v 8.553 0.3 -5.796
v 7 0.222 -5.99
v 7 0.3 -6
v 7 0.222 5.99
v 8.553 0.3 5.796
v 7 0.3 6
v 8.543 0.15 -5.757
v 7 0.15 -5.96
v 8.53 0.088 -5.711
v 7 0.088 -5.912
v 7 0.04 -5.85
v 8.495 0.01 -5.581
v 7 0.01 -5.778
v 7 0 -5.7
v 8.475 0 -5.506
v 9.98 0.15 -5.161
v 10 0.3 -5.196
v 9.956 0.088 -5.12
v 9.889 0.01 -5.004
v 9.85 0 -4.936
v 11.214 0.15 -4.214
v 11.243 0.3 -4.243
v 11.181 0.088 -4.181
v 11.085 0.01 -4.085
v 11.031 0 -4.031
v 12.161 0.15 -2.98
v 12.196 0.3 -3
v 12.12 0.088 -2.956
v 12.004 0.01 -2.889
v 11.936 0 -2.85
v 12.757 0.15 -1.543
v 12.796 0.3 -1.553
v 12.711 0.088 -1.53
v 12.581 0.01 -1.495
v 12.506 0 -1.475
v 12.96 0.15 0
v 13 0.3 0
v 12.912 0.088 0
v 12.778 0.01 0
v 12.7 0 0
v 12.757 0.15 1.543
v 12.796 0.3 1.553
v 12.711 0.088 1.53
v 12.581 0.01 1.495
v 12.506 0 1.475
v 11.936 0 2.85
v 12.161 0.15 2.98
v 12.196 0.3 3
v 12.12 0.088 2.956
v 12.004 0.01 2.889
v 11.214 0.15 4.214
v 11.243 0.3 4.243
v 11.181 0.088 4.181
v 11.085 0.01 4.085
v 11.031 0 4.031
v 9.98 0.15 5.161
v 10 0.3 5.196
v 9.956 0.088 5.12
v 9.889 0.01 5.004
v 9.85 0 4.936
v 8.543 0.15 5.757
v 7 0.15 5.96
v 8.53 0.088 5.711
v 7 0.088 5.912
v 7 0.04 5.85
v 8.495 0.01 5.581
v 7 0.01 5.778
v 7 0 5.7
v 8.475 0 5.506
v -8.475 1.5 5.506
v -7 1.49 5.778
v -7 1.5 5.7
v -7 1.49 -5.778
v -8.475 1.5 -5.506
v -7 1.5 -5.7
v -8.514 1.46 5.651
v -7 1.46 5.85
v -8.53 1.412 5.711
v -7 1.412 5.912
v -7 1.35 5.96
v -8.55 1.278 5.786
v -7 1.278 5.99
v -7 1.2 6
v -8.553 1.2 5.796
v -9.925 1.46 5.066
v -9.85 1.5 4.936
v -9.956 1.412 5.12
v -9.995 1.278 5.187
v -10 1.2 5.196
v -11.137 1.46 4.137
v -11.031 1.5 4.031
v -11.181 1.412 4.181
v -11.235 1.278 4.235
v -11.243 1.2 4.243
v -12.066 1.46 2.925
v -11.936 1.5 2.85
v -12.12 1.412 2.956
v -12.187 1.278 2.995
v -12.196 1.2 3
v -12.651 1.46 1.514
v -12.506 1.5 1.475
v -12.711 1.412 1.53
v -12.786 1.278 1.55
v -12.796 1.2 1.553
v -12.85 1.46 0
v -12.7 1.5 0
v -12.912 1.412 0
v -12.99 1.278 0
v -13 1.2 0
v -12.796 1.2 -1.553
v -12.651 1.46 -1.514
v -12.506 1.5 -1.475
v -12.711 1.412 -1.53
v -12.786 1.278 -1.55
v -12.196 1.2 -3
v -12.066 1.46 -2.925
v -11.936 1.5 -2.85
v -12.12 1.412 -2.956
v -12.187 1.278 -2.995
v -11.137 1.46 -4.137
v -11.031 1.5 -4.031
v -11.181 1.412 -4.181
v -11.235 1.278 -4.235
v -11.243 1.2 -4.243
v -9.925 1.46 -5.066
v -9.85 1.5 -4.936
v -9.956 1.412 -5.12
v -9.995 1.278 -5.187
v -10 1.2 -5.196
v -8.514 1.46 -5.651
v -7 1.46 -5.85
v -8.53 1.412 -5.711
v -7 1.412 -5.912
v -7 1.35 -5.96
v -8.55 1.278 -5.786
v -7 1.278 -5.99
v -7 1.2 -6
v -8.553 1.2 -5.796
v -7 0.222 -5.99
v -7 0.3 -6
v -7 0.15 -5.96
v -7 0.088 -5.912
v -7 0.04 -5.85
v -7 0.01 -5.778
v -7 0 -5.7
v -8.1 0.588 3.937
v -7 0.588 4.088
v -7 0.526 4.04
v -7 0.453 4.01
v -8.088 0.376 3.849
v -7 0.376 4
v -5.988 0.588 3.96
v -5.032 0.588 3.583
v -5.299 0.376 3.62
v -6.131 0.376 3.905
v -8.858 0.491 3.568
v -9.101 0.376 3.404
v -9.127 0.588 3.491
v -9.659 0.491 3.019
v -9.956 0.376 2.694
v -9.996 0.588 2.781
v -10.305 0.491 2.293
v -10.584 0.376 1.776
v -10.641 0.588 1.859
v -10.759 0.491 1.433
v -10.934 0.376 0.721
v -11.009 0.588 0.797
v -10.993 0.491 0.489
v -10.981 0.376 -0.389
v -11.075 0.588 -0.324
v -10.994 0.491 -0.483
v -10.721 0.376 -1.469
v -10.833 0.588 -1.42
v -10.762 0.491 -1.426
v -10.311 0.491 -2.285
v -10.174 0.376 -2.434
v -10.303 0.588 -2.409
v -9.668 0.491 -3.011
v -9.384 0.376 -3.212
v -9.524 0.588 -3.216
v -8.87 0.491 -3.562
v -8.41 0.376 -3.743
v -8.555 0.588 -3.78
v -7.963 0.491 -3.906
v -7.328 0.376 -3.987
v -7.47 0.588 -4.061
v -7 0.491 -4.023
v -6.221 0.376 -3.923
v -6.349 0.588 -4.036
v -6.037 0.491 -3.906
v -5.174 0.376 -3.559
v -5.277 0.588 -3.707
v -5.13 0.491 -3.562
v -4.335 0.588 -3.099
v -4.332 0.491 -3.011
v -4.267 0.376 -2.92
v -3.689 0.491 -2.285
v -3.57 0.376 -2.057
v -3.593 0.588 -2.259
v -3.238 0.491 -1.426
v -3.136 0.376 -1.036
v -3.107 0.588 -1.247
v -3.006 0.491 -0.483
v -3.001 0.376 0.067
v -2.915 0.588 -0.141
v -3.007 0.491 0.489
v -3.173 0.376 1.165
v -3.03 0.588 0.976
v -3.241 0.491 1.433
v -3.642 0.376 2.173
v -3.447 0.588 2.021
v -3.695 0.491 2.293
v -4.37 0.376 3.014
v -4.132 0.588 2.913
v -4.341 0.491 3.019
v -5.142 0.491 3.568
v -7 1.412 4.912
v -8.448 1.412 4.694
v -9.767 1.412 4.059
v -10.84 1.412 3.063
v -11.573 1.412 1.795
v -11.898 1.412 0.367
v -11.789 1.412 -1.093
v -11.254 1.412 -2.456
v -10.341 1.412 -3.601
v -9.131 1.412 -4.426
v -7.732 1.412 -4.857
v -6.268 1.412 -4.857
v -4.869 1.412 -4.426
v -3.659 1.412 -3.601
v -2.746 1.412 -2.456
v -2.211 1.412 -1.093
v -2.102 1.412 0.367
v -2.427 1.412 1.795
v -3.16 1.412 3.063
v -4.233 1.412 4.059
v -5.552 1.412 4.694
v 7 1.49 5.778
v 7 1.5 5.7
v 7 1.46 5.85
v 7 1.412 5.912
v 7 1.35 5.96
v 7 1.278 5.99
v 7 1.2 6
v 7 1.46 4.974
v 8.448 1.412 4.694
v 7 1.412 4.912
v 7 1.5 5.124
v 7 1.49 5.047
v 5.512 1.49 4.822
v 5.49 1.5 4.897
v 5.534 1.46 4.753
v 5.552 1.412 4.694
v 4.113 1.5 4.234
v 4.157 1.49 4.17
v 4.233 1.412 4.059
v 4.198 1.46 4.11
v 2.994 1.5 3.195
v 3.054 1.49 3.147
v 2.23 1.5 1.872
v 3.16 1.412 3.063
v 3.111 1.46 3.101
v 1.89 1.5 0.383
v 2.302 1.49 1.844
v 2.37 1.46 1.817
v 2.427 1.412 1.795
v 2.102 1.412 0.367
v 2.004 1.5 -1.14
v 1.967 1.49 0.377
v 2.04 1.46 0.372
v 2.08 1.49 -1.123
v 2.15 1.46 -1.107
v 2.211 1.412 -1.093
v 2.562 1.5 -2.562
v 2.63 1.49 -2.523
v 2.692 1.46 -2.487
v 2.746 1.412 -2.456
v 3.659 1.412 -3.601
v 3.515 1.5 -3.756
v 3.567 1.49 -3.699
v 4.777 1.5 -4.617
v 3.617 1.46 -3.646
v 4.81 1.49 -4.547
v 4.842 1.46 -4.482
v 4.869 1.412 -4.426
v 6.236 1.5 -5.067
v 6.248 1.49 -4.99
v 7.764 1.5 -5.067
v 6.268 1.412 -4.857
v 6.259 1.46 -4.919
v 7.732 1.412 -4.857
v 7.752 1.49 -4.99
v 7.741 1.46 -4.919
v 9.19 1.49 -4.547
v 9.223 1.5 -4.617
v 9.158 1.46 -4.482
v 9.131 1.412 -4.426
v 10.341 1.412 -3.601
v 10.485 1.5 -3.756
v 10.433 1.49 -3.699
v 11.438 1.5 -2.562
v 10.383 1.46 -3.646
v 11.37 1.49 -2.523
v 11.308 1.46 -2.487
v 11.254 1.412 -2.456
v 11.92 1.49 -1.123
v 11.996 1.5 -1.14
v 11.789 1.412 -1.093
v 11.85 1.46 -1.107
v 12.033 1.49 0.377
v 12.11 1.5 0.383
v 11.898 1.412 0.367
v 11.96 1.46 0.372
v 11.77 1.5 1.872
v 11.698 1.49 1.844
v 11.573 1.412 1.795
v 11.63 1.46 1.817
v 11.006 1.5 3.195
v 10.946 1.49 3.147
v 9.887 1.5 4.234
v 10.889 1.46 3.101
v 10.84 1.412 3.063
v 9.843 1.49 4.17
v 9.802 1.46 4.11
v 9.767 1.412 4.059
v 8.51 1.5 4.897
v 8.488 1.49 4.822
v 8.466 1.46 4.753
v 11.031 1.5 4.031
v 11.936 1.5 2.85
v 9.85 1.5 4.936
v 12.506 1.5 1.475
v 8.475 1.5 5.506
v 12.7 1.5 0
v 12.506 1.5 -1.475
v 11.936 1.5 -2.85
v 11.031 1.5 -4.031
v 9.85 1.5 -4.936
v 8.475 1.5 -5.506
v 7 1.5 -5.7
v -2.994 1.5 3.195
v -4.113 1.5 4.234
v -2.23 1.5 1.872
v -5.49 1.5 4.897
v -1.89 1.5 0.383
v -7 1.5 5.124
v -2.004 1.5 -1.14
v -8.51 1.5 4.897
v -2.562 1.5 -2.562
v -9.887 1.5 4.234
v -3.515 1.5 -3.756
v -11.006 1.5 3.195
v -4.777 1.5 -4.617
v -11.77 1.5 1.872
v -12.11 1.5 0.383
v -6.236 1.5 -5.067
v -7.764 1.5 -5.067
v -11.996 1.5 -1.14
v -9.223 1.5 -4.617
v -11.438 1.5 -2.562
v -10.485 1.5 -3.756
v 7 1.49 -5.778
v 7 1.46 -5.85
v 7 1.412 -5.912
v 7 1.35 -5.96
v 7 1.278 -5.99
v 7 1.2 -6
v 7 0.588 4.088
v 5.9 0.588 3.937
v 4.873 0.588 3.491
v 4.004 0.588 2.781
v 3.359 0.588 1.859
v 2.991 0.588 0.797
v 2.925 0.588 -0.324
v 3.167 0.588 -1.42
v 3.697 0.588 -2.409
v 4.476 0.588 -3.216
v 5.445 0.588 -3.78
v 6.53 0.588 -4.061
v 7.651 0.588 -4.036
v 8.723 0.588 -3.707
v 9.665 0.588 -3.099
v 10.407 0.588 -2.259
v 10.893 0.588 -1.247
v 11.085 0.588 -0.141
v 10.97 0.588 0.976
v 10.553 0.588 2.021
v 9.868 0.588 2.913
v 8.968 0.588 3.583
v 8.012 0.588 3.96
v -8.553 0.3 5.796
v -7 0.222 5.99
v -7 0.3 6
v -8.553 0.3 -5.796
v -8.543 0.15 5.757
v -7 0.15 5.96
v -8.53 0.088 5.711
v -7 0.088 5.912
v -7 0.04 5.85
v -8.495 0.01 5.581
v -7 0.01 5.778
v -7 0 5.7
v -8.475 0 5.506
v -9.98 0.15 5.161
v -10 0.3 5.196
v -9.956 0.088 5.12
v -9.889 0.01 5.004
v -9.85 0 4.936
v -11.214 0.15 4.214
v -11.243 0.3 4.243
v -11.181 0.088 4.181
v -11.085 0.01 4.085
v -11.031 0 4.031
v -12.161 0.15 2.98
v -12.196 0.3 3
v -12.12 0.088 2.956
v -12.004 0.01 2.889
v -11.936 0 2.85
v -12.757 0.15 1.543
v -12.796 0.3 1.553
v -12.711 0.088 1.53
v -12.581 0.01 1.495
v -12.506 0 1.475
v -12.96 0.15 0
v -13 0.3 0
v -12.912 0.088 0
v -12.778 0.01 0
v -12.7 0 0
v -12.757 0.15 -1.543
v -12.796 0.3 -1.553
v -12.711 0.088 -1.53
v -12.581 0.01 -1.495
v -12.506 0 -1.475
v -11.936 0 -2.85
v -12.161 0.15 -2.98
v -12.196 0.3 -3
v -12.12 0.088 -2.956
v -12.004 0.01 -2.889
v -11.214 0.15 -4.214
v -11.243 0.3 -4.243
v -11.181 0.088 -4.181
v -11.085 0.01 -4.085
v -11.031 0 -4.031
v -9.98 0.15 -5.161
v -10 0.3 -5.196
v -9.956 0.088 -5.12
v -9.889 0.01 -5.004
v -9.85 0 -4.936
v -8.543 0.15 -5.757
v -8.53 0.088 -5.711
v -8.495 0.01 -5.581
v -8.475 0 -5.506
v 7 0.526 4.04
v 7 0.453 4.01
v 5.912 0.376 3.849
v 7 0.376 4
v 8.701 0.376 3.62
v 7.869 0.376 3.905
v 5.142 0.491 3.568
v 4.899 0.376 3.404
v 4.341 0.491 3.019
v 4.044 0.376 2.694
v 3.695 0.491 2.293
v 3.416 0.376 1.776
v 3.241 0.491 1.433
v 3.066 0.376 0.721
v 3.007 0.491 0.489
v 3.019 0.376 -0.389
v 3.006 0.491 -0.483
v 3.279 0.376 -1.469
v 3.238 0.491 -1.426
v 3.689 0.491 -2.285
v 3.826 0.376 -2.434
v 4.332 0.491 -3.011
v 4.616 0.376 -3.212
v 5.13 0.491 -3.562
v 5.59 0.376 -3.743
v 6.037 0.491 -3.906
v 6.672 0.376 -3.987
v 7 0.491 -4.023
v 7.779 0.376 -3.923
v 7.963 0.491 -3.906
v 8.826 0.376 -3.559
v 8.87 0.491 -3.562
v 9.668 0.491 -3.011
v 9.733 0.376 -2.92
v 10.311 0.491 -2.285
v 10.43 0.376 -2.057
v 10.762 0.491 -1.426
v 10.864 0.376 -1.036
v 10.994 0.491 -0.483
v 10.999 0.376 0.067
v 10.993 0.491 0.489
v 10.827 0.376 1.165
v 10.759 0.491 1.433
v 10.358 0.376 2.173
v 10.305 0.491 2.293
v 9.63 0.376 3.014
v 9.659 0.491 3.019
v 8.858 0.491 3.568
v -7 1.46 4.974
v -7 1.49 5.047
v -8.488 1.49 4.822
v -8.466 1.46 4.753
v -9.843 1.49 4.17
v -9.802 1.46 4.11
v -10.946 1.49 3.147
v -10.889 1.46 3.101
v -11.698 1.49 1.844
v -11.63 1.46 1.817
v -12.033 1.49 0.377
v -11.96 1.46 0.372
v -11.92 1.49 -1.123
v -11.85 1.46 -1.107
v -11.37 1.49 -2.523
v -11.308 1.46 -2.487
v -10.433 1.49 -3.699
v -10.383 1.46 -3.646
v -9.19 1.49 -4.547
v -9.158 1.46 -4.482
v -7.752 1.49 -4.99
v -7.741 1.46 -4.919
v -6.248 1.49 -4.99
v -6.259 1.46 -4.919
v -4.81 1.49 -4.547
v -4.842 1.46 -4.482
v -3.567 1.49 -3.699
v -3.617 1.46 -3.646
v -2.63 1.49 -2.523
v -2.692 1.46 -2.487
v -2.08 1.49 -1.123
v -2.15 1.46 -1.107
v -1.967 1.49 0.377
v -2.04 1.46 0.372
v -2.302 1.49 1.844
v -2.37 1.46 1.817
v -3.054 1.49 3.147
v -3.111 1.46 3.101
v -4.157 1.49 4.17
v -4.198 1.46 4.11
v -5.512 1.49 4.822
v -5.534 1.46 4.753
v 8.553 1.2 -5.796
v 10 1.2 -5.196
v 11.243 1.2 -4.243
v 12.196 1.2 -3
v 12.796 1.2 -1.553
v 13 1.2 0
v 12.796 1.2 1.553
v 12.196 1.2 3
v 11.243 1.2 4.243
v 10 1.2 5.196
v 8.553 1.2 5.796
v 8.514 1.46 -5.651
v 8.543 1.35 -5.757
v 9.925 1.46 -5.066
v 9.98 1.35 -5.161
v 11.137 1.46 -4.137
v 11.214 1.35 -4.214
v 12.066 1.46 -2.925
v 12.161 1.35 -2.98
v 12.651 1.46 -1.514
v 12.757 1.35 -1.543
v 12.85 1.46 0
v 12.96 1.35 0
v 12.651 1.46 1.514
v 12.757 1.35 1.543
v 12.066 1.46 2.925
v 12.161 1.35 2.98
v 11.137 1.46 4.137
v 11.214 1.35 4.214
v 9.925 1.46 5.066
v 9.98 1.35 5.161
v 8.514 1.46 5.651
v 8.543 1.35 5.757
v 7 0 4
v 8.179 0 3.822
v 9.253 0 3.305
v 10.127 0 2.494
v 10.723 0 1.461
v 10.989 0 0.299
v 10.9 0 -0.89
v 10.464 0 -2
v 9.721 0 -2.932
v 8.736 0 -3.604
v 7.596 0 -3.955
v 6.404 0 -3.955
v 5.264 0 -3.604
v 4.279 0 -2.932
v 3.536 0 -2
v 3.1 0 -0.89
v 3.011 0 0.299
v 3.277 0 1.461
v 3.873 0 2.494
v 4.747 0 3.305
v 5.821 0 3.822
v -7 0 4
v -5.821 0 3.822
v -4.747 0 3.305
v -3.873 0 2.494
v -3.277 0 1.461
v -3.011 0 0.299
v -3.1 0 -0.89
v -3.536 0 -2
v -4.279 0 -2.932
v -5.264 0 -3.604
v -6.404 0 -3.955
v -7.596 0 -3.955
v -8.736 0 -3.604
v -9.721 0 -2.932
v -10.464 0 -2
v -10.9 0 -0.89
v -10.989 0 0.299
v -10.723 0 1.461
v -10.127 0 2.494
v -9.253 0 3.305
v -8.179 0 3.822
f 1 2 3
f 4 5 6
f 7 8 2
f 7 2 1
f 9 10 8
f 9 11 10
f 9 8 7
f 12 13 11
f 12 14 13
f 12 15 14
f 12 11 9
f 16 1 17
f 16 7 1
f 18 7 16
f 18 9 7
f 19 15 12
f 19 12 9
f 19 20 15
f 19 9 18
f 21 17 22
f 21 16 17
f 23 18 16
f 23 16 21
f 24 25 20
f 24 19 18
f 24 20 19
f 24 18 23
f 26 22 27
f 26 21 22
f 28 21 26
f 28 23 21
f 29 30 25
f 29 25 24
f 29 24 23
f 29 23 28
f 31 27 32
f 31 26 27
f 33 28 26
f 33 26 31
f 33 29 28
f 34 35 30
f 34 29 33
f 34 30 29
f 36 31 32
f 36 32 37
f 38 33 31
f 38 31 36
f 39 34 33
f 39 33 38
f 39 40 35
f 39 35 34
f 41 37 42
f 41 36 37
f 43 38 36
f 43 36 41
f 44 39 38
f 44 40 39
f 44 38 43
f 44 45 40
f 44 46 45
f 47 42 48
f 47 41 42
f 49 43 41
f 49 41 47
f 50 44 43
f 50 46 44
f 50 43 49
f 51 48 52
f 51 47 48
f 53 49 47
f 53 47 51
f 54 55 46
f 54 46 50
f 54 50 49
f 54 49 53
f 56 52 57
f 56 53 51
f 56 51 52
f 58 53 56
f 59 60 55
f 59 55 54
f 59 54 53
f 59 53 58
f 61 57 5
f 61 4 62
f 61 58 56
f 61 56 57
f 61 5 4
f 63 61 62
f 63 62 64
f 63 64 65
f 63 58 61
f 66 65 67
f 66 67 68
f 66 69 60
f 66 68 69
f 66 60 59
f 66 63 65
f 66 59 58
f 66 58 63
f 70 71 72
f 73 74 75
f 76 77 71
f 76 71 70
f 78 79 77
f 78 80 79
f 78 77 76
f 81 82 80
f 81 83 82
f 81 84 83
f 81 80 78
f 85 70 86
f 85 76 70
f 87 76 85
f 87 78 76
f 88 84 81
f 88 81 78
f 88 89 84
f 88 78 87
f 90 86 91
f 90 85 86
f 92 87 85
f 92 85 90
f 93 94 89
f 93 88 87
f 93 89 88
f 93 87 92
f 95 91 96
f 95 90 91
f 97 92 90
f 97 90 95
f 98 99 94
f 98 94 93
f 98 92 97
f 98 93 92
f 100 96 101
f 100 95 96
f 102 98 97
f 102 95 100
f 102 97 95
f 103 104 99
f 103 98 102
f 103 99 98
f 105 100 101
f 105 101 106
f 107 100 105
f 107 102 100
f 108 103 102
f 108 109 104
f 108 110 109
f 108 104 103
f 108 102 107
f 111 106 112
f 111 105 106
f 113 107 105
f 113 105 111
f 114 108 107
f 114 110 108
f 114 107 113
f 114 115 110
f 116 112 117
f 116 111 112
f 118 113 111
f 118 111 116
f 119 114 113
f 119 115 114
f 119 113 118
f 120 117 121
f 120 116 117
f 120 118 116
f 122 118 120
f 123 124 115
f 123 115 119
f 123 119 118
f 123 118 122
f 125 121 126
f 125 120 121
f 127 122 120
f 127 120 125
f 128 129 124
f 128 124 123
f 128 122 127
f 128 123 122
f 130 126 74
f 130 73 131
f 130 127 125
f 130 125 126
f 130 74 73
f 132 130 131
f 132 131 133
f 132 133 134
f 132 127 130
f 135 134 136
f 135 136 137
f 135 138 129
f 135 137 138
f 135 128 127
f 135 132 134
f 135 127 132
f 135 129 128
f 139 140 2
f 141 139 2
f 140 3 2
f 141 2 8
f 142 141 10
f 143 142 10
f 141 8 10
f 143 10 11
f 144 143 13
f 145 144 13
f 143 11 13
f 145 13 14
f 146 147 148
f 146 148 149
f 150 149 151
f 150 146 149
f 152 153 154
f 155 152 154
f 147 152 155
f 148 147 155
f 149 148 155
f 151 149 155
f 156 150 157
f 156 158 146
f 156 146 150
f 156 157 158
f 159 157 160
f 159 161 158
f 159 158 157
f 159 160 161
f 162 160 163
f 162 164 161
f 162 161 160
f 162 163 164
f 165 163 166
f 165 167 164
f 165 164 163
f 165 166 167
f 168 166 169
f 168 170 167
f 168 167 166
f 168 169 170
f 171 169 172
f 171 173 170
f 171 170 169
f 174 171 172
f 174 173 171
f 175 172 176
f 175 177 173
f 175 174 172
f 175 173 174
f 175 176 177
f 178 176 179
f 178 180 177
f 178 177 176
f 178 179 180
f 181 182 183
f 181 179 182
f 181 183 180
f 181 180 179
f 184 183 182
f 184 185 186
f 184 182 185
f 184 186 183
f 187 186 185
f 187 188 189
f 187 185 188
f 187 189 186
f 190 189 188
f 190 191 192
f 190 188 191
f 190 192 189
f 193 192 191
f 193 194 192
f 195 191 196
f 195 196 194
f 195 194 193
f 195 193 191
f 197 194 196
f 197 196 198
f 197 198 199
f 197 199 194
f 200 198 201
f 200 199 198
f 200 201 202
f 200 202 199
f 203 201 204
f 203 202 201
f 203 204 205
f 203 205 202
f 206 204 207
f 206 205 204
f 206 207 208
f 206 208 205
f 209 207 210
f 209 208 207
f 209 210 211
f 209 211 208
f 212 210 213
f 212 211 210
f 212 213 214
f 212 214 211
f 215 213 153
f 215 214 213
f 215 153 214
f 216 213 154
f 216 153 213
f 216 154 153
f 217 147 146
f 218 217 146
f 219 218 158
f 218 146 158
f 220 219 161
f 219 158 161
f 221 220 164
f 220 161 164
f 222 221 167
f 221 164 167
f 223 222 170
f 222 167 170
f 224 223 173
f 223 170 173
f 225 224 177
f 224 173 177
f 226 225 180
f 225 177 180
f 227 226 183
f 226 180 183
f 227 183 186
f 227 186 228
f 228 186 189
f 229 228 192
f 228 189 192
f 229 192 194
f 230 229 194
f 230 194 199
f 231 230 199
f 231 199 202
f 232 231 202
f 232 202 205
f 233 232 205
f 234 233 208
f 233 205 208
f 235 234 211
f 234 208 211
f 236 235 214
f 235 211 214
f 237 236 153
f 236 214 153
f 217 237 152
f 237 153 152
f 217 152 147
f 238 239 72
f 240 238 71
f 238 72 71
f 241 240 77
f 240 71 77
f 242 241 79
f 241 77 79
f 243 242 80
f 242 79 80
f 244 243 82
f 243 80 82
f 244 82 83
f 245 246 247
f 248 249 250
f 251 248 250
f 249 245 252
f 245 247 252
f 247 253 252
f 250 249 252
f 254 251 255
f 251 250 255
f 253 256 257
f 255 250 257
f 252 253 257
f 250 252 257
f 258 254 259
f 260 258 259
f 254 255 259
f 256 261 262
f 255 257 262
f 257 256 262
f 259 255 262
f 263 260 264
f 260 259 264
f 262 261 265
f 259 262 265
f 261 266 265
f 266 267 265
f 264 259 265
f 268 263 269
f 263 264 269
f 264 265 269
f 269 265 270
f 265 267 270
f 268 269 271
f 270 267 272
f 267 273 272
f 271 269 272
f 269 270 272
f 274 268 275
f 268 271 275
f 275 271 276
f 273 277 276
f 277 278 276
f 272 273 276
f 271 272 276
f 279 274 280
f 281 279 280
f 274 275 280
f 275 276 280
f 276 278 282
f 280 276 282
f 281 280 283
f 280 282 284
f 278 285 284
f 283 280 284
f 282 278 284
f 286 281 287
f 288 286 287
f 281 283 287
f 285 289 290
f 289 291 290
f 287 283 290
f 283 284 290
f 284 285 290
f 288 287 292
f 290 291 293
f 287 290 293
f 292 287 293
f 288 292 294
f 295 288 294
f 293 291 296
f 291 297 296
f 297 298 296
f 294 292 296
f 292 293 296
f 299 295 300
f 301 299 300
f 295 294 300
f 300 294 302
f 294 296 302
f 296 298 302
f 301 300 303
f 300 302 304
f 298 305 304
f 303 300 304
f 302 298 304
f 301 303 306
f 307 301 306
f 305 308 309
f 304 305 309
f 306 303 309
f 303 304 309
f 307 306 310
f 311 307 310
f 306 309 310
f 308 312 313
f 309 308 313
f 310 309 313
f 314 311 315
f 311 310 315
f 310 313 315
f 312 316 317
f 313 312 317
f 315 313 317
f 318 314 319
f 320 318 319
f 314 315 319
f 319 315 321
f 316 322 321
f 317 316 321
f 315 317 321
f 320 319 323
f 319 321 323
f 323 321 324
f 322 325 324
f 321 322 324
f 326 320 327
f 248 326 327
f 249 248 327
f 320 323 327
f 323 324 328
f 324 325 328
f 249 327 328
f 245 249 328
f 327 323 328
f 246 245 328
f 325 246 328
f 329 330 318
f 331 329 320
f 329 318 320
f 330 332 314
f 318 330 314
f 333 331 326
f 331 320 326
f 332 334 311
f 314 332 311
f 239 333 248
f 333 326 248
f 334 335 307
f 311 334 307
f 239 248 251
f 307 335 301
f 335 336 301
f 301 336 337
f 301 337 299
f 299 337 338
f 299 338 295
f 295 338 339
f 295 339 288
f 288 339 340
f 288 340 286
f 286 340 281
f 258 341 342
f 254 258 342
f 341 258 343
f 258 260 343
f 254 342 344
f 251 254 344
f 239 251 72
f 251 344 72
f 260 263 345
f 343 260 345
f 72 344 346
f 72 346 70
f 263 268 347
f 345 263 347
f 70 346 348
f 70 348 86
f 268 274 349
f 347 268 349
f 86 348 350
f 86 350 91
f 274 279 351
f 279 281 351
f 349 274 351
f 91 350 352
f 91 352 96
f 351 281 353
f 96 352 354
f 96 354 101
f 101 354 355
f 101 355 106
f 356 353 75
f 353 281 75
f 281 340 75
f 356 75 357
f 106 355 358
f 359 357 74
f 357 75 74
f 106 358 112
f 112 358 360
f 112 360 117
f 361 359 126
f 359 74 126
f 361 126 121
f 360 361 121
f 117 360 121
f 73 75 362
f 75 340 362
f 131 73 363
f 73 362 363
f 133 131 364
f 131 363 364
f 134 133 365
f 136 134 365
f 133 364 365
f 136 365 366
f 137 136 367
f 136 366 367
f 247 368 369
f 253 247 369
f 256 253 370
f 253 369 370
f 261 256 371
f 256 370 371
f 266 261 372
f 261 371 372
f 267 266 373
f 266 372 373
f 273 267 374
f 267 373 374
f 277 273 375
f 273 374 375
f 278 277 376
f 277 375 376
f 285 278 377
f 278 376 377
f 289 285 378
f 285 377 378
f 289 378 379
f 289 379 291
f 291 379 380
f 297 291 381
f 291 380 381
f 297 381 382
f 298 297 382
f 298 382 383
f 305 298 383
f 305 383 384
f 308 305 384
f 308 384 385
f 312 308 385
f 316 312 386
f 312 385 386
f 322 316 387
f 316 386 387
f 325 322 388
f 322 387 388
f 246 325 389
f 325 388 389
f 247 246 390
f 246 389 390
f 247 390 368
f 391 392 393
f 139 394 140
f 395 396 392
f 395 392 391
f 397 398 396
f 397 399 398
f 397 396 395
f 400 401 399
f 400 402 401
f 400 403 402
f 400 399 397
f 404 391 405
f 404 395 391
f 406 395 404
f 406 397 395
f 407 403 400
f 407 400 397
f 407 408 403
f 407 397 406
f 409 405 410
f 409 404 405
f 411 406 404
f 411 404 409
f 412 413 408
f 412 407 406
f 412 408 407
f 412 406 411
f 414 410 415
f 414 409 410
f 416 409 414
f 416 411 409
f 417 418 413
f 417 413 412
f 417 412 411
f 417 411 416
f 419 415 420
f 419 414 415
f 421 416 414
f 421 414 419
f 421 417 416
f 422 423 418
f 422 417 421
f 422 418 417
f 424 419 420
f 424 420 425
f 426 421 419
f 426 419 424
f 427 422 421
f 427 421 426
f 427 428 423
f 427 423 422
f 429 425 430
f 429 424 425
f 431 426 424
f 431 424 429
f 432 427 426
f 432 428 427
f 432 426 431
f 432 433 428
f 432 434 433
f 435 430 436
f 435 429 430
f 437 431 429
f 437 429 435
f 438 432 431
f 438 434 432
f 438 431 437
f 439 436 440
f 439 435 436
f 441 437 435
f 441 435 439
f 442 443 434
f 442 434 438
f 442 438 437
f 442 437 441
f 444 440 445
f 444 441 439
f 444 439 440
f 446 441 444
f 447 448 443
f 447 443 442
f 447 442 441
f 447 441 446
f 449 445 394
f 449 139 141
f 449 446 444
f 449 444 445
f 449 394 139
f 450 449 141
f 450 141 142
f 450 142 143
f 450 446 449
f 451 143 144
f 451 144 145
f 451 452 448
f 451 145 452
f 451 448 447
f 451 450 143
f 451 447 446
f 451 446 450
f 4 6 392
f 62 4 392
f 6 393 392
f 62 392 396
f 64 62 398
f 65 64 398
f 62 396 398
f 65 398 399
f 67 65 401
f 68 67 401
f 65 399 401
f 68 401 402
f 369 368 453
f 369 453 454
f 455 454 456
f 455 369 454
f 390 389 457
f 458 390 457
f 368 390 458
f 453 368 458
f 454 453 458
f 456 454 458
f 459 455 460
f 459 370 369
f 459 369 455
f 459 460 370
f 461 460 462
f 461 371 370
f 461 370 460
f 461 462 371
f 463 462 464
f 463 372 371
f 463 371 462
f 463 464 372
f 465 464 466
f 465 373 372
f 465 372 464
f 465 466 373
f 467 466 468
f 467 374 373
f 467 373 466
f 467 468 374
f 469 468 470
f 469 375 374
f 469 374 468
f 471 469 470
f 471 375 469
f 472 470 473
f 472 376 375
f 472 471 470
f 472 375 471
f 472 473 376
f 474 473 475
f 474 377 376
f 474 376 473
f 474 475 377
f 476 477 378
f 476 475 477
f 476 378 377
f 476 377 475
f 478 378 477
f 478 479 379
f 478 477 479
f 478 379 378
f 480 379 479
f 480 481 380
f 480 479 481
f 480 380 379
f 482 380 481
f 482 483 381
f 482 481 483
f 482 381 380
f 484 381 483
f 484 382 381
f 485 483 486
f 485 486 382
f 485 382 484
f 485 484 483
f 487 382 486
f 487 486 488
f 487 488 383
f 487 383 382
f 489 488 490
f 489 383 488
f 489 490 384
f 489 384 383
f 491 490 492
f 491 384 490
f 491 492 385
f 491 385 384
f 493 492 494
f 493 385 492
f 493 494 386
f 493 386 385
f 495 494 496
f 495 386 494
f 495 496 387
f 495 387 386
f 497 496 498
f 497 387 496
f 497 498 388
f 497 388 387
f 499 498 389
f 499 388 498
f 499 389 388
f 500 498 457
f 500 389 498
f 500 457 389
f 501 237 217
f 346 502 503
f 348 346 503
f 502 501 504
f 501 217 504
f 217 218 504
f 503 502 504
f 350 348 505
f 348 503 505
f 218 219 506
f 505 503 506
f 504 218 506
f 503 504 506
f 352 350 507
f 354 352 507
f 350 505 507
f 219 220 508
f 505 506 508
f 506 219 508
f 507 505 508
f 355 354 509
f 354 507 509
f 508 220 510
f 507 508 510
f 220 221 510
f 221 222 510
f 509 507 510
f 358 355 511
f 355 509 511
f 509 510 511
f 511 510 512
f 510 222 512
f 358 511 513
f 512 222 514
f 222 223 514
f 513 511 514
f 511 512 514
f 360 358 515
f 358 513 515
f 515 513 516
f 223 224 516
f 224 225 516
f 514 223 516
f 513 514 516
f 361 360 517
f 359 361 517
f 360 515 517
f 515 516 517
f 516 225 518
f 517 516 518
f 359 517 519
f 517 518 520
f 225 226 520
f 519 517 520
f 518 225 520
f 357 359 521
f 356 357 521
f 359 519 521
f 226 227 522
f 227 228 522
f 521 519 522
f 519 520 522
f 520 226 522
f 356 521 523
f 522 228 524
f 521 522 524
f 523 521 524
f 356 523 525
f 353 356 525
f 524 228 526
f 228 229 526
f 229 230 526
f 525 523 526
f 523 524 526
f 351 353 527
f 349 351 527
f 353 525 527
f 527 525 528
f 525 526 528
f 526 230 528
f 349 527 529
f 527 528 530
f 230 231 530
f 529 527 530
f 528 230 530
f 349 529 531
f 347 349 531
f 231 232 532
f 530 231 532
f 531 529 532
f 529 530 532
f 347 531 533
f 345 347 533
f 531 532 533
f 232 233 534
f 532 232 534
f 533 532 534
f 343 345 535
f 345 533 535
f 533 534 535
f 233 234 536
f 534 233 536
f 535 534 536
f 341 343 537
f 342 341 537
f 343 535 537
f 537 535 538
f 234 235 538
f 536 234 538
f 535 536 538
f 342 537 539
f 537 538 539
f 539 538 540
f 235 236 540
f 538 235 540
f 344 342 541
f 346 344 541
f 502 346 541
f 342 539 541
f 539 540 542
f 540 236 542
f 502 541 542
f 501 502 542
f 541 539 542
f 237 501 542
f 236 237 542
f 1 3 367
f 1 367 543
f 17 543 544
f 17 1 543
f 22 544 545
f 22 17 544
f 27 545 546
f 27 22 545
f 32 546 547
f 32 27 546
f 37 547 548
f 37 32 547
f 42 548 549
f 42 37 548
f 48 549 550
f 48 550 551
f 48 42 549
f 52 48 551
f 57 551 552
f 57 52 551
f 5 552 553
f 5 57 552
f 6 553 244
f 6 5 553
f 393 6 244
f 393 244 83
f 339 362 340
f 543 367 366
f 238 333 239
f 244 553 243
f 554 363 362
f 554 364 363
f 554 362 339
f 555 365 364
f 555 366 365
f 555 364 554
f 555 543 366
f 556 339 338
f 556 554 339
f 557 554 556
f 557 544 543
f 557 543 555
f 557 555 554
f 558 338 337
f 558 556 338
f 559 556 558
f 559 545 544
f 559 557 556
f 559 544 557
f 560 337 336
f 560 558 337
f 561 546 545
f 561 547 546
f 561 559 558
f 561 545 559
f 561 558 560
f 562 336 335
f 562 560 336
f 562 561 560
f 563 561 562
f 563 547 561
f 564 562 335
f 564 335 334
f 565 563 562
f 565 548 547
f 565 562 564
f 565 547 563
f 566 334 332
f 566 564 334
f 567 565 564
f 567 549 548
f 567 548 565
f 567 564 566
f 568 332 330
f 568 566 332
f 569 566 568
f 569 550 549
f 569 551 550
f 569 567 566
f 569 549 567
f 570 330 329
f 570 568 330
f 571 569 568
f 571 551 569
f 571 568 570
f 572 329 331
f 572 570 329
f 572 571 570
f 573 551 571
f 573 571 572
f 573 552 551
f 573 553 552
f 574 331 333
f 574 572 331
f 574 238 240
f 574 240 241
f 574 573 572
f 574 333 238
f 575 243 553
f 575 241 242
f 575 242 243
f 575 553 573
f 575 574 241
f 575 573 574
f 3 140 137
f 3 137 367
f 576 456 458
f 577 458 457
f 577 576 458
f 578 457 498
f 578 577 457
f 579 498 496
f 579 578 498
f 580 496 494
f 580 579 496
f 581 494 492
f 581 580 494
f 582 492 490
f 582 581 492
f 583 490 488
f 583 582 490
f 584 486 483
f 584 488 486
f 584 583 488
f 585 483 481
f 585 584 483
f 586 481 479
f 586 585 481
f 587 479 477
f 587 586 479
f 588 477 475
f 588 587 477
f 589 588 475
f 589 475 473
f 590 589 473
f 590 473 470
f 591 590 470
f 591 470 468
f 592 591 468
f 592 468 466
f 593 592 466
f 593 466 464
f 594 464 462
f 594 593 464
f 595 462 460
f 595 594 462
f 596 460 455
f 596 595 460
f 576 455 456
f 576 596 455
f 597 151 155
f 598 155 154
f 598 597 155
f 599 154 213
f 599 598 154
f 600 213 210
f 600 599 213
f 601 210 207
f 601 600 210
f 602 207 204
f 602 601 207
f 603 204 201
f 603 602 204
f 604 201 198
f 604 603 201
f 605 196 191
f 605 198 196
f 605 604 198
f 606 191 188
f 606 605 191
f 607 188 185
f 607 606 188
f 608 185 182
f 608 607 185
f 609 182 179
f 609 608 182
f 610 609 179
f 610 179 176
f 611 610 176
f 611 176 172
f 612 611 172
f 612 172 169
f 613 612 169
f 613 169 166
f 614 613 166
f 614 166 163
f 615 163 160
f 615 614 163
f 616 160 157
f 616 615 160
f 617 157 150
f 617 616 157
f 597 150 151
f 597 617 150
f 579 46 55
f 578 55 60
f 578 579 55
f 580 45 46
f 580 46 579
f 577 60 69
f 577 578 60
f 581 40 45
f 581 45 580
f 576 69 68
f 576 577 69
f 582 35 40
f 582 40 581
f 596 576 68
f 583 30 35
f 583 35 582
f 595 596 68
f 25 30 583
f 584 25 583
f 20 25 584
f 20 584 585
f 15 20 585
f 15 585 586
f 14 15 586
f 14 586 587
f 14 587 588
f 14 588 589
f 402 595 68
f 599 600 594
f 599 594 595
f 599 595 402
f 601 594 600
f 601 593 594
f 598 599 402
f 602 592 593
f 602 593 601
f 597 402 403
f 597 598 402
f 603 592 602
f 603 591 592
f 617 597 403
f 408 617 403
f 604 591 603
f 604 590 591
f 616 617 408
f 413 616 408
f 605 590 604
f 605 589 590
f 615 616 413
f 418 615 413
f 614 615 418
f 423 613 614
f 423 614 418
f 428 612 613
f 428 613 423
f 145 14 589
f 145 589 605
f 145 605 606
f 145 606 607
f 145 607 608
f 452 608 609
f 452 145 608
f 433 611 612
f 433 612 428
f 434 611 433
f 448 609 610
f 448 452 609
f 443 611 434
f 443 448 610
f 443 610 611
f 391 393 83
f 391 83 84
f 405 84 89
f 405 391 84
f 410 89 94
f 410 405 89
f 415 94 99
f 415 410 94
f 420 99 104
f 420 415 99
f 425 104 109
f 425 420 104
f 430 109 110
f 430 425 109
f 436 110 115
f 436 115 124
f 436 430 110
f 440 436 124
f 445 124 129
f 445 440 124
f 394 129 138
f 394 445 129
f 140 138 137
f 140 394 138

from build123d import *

# Parameters (mm, degrees)
BOSS_EXTRUDE1_DEPTH = 1.5
SKETCH2_R           = 4
CUT_EXTRUDE2_DEPTH  = 2.5
CHAMFER1_SIZE       = 1
FILLET1_R           = 0.3


with BuildPart() as part:
    # Sketch1 → Boss-Extrude1 (new body)
    with BuildSketch(Plane(origin=(0, 0, 0), x_dir=(1, 0, 0), z_dir=(0, 1, 0))):
        with BuildLine():
            Line((-7, 6), (7, 6))
            ThreePointArc((7, 6), (13, 0), (7, -6))
            Line((7, -6), (-7, -6))
            ThreePointArc((-7, -6), (-13, 0), (-7, 6))
        make_face()
    extrude(amount=BOSS_EXTRUDE1_DEPTH)

    # Sketch2 → Cut-Extrude2 (cut, through all)
    with BuildSketch(Plane(origin=(0, 0, 0), x_dir=(1, 0, 0), z_dir=(0, 1, 0))):
        with Locations(Location((-7, 0, 0), (0, 0, 270))):  # turned: the seam where the file's is
            Circle(SKETCH2_R)
        with Locations(Location((7, 0, 0), (0, 0, 270))):  # turned: the seam where the file's is
            Circle(SKETCH2_R)
    extrude(amount=CUT_EXTRUDE2_DEPTH, mode=Mode.SUBTRACT)

    # Chamfer1
    chamfer1_edges = [part.edges().sort_by_distance(p)[0] for p in [
        (-7, 1.5, -4),
        (7, 1.5, -4),
    ]]
    chamfer(chamfer1_edges, length=CHAMFER1_SIZE)

    # Fillet1
    fillet1_edges = [part.edges().sort_by_distance(p)[0] for p in [
        (13, 1.5, 0),
        (0, 1.5, -6),
        (-7, 0.5, -4),
        (7, 1.5, -5),
        (-7, 1.5, -5),
        (7, 0.5, -4),
        (-13, 1.5, 0),
        (0, 0, -6),
        (13, 0, 0),
        (0, 0, 6),
        (-13, 0, 0),
        (0, 1.5, 6),
    ]]
    fillet(fillet1_edges, radius=FILLET1_R)


solid = part.part
